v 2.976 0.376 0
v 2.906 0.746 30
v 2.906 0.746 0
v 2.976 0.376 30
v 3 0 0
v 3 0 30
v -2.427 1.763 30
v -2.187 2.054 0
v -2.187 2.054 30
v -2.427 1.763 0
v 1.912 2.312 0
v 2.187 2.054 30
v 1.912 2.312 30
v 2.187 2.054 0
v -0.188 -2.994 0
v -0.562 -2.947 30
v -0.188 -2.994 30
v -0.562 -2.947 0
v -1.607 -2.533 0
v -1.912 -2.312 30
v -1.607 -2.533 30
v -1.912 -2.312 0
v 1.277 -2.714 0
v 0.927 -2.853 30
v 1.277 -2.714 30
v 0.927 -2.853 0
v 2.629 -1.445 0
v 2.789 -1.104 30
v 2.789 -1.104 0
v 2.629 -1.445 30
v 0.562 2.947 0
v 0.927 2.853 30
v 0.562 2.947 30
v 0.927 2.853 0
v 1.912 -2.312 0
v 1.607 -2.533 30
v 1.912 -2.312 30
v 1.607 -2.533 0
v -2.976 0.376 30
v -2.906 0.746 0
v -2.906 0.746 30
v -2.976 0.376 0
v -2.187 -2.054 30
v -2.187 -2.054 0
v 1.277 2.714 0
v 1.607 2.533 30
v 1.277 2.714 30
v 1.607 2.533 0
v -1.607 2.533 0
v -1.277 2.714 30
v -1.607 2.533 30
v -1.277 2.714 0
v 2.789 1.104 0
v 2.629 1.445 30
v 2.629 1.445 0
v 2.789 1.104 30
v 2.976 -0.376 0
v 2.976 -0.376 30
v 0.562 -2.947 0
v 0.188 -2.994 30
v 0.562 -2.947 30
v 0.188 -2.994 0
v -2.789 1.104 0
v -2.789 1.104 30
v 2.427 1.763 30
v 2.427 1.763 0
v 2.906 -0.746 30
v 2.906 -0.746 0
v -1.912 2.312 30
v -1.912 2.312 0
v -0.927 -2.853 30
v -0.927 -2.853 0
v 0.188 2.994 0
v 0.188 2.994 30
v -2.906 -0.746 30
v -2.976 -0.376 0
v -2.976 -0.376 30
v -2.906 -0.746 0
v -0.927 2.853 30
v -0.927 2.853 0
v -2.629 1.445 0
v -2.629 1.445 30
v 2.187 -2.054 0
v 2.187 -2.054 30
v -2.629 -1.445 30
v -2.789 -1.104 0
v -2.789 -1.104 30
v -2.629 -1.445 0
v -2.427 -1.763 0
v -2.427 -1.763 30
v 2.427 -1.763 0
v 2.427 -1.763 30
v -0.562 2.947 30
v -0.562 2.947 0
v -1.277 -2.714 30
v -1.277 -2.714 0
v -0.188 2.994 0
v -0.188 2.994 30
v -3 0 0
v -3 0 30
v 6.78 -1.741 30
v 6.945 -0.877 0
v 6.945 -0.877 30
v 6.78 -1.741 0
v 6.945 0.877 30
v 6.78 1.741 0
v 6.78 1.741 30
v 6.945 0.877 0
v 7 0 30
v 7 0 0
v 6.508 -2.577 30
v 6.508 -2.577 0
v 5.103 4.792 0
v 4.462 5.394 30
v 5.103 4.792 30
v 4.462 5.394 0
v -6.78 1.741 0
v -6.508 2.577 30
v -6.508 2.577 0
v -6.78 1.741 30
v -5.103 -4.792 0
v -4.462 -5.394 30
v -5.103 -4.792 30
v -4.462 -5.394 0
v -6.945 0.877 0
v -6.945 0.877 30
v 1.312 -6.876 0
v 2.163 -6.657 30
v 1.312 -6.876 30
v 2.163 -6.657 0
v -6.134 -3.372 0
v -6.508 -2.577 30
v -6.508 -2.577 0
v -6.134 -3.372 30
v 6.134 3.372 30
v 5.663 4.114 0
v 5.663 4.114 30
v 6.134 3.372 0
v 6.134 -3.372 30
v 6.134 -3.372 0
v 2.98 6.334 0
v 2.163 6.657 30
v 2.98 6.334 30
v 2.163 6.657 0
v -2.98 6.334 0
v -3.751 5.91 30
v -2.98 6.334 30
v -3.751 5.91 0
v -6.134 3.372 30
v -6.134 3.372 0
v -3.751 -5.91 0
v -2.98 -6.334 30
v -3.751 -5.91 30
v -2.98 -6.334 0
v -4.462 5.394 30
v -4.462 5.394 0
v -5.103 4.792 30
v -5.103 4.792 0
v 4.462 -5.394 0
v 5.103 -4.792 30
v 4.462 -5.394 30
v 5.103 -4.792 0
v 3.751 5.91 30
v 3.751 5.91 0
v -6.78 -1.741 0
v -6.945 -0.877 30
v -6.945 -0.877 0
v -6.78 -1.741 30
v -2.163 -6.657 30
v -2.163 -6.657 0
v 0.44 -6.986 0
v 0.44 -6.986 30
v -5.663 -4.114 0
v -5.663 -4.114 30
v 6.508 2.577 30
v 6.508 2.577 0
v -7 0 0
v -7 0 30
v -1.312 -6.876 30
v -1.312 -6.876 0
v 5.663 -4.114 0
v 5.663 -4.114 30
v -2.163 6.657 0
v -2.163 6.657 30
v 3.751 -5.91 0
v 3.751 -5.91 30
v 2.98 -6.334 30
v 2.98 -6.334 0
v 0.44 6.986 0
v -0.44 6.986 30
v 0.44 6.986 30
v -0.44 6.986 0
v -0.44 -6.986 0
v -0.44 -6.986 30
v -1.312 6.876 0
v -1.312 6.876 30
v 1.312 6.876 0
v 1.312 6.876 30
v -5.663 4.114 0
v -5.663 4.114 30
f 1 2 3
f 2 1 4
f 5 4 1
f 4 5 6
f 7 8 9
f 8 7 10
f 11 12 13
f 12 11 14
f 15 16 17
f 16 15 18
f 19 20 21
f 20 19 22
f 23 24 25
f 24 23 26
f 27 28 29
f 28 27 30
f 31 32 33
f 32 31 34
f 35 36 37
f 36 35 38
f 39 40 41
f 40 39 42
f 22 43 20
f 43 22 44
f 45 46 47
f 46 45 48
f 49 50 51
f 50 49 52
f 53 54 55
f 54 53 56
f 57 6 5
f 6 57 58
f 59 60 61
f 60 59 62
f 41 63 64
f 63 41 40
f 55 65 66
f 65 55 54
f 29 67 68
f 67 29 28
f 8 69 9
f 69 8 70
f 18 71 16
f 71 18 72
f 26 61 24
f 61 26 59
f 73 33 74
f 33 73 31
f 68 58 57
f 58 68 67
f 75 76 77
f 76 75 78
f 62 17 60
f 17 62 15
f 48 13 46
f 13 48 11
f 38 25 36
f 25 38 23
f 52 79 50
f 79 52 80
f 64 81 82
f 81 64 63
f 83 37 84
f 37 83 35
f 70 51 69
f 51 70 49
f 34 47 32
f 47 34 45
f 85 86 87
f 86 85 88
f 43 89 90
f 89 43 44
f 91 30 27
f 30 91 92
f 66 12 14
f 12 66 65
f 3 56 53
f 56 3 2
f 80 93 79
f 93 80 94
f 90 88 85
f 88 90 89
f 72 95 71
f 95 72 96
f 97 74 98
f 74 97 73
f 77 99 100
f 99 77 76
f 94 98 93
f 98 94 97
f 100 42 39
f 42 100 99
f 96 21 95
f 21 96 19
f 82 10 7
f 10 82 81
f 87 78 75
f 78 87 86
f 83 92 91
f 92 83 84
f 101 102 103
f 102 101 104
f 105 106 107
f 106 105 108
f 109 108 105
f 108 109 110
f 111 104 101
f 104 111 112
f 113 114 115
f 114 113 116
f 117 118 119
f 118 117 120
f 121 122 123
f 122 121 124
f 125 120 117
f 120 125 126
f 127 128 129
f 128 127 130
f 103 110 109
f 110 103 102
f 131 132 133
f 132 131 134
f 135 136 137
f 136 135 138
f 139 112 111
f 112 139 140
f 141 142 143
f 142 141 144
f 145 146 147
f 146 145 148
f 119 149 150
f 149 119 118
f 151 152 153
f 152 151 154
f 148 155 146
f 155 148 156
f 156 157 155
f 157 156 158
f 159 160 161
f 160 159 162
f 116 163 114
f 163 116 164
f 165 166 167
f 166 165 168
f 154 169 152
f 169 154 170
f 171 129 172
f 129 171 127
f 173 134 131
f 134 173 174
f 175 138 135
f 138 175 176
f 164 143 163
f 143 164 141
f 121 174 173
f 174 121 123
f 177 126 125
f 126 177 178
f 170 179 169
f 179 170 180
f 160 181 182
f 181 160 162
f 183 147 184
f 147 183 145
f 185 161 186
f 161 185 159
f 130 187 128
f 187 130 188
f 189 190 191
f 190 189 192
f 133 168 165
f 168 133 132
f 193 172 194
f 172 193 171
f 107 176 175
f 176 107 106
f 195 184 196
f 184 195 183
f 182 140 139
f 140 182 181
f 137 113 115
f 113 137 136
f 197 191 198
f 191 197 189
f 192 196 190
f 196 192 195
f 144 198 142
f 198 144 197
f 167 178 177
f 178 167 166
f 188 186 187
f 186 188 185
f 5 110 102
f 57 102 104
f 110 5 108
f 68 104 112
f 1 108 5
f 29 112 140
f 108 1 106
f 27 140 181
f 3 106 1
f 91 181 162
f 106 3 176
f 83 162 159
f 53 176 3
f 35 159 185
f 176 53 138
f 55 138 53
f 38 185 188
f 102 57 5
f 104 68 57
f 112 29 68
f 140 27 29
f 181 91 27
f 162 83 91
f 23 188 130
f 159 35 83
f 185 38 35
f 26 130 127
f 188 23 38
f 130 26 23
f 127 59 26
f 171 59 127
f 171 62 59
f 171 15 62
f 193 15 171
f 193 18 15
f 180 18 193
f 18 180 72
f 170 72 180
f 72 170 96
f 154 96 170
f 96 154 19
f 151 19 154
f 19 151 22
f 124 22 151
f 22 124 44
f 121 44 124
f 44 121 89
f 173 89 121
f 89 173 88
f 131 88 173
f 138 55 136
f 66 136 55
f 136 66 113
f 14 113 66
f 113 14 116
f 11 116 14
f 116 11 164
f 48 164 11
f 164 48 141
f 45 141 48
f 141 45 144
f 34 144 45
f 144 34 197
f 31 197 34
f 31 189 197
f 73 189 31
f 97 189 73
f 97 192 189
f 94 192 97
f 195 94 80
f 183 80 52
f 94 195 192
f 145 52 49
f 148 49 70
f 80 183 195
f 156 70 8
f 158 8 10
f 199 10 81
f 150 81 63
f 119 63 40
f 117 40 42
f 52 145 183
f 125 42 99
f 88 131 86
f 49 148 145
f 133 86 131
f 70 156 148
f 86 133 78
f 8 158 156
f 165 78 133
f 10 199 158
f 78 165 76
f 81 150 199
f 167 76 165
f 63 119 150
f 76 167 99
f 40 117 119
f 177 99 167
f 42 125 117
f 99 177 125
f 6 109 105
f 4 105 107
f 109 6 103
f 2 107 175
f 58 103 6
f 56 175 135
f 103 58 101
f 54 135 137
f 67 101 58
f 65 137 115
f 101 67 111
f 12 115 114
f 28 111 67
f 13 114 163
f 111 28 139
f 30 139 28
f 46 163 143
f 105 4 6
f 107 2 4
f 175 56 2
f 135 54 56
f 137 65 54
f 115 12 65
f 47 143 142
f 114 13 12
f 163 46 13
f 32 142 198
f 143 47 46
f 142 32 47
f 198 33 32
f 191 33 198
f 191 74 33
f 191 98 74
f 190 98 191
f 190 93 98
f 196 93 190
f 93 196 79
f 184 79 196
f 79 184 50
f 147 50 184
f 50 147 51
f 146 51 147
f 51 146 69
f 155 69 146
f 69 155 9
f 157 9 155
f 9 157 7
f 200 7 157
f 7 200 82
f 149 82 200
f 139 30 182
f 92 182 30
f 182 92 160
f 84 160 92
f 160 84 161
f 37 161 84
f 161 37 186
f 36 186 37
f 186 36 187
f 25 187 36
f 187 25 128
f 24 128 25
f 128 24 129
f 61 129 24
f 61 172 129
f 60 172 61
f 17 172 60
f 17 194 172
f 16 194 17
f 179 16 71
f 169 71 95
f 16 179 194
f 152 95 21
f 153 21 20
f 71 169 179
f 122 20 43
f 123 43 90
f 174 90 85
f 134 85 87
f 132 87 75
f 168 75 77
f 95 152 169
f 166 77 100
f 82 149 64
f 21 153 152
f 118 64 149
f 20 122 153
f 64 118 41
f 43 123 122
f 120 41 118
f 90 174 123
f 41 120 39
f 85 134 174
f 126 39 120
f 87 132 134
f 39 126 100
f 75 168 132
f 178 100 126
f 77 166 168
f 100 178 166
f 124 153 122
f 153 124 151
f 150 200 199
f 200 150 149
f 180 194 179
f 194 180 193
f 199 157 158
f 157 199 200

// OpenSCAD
$fn = 50;


difference() {
	union() {
		cylinder(h = 30, r = 7.0000000000);
	}
	union() {
		translate(v = [0.0000000000, 0.0000000000, -100.0000000000]) {
			cylinder(h = 200, r = 3.0000000000);
		}
		translate(v = [0.0000000000, 0.0000000000, -100.0000000000]) {
			cylinder(h = 200, r = 3.0000000000);
		}
		translate(v = [0.0000000000, 0.0000000000, -100.0000000000]) {
			cylinder(h = 200, r = 3.0000000000);
		}
		translate(v = [0.0000000000, 0.0000000000, -100.0000000000]) {
			cylinder(h = 200, r = 3.0000000000);
		}
	}
}
